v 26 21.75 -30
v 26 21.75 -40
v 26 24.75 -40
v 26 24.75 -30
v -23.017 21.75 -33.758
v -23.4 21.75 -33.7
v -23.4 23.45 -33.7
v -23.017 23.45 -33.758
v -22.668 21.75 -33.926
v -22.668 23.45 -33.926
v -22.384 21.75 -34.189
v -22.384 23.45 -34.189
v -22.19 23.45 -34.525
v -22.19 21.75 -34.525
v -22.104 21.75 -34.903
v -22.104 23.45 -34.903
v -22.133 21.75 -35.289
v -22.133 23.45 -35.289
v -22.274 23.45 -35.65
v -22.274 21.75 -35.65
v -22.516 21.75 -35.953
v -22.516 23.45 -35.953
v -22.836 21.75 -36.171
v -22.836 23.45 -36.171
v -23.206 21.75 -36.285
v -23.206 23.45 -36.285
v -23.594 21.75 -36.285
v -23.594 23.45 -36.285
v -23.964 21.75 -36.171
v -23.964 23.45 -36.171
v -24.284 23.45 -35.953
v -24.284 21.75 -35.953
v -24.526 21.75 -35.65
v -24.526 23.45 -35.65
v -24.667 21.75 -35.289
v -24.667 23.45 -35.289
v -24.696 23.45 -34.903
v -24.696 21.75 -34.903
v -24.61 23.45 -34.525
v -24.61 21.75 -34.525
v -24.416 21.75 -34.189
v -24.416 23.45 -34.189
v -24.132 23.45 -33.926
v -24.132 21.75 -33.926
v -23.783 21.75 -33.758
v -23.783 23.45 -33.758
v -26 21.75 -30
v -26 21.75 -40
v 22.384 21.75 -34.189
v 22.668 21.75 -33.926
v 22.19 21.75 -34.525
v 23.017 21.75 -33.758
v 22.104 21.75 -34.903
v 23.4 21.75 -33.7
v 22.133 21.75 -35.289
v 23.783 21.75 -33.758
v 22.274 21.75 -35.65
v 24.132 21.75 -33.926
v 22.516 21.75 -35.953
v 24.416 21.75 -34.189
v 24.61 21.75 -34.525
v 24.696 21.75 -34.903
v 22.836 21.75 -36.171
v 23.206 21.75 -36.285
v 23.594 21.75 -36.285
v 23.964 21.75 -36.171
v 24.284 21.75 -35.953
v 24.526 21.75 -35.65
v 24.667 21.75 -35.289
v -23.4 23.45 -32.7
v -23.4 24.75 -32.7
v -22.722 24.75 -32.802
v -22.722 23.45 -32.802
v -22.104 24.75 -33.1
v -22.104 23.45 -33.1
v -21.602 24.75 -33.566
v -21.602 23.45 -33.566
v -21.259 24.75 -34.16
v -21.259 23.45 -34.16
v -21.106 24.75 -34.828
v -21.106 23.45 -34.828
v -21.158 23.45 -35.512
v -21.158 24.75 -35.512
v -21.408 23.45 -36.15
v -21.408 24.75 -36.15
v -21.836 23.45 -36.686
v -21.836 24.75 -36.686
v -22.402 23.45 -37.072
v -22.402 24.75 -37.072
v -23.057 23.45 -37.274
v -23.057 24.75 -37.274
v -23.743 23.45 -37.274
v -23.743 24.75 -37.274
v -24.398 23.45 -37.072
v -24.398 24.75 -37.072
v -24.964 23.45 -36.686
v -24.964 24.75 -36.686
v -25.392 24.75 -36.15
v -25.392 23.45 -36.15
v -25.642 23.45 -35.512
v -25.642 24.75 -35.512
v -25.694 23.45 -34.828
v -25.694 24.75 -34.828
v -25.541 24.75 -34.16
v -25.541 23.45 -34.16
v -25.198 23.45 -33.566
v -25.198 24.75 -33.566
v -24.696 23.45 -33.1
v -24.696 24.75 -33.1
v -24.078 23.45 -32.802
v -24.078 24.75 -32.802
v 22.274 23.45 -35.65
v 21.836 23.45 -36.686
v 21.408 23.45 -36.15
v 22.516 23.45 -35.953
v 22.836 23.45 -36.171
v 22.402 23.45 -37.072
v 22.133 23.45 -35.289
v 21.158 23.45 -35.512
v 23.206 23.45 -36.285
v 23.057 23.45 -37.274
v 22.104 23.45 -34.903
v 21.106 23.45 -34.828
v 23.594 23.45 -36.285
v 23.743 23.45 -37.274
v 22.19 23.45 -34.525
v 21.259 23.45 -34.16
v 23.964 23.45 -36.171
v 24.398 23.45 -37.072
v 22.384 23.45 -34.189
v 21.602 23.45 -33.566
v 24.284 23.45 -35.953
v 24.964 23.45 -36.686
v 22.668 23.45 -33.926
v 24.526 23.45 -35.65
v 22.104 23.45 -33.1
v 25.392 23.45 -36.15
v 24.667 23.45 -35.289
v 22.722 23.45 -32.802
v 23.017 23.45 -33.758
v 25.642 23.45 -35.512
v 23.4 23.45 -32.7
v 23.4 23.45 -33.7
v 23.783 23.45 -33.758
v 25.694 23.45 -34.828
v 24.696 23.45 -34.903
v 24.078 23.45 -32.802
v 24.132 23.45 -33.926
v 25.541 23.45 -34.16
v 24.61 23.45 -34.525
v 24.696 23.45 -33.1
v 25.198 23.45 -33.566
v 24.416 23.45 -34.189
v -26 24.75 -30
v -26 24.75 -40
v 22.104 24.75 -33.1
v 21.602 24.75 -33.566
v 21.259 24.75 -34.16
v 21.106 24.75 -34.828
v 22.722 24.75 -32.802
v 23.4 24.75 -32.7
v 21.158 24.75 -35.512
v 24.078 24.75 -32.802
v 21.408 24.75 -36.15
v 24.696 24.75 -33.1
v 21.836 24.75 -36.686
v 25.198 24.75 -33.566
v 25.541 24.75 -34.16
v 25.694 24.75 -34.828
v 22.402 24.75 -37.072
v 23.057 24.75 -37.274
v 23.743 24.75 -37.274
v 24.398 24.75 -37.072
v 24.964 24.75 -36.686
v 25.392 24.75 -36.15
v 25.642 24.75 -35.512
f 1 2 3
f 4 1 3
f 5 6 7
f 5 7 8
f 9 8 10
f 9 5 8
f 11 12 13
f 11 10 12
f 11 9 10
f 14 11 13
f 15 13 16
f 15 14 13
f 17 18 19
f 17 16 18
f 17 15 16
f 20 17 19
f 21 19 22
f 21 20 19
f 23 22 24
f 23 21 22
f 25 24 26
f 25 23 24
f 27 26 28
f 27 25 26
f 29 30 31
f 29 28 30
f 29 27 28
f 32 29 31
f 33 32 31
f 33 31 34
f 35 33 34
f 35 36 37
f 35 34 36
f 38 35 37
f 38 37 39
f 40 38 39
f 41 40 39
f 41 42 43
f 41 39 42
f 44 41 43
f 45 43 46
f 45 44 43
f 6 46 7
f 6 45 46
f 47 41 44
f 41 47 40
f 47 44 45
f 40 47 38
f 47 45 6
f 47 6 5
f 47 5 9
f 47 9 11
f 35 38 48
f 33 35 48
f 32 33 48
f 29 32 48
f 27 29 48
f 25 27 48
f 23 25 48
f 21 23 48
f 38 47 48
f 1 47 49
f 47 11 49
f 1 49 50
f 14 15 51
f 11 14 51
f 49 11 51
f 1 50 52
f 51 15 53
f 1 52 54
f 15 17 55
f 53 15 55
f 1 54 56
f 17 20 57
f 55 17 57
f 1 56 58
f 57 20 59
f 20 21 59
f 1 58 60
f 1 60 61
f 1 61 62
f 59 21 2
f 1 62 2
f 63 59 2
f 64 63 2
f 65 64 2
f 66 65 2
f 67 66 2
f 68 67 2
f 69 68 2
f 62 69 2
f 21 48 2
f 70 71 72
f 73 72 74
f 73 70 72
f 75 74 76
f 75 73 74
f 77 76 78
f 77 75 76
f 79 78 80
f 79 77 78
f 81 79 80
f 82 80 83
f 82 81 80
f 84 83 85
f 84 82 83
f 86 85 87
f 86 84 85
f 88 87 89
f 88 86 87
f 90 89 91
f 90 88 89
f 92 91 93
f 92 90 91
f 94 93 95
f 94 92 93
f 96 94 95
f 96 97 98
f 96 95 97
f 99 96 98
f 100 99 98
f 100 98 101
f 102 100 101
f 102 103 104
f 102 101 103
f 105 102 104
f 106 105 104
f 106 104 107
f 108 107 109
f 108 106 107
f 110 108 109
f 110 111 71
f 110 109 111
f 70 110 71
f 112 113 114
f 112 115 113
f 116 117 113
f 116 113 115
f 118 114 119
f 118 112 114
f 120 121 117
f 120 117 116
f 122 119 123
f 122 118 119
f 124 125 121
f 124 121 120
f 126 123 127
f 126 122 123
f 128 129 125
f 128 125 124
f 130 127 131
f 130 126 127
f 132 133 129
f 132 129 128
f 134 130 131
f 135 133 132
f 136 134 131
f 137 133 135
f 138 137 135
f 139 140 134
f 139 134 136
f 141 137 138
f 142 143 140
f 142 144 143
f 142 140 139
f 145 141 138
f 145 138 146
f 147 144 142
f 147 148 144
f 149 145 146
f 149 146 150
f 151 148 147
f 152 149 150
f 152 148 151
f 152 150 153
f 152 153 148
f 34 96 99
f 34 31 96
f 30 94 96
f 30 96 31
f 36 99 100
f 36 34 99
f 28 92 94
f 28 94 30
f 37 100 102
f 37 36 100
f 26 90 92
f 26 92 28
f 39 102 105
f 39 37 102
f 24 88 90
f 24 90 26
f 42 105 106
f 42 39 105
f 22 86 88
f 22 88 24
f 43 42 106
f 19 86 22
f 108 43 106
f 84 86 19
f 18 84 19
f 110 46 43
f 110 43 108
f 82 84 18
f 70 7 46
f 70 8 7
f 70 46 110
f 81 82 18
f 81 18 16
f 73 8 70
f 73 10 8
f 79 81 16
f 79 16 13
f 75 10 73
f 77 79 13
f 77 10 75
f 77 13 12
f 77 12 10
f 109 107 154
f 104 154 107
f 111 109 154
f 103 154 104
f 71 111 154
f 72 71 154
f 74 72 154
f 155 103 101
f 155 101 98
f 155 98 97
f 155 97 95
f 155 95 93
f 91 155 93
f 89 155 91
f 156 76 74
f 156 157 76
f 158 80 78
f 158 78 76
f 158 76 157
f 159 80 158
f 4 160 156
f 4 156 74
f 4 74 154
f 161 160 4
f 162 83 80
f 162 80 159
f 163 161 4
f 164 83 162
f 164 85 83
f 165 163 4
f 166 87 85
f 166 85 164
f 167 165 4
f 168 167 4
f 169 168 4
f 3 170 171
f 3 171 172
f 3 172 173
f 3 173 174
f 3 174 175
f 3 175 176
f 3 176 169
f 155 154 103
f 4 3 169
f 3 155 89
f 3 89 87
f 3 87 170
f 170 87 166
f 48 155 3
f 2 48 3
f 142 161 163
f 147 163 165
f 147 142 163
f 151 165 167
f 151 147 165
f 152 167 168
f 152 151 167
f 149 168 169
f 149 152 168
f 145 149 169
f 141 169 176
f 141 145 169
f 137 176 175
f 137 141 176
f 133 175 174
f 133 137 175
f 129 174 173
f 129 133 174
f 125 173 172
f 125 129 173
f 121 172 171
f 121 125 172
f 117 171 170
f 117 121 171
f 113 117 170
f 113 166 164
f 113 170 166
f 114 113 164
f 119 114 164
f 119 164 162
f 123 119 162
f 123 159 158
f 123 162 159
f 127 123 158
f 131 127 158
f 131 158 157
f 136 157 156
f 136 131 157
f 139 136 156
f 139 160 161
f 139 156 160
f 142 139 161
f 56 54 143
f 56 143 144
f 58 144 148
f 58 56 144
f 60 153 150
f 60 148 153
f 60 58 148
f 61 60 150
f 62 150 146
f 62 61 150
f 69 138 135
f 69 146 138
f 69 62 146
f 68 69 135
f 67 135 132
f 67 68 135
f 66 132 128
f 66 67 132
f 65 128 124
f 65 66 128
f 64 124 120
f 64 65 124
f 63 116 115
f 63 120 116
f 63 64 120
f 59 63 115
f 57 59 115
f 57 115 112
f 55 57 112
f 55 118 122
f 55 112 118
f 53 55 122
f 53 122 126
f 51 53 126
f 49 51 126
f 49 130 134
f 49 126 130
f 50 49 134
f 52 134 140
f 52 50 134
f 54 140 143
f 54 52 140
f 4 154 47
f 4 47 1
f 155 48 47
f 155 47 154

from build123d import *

# Parameters (mm, degrees)
BOSS_EXTRUDE1_START = -40
SKETCH1_W           = 52
SKETCH1_H           = 3
BOSS_EXTRUDE1_DEPTH = 10
BOSS_EXTRUDE2_START = 20
SKETCH2_R           = 1.3
BOSS_EXTRUDE2_DEPTH = 6
BOSS_EXTRUDE3_START = 23.45
SKETCH3_R           = 2.3
BOSS_EXTRUDE3_DEPTH = 2.55
BOSS_EXTRUDE4_START = 20
SKETCH4_R           = 1.3
BOSS_EXTRUDE4_DEPTH = 6
BOSS_EXTRUDE5_START = 23.45
SKETCH5_R           = 2.3
BOSS_EXTRUDE5_DEPTH = 2.55


with BuildPart() as part:
    # Sketch1 → Boss-Extrude1 (new body)
    with BuildSketch(Plane.XY.offset(BOSS_EXTRUDE1_START)):
        with Locations((0, 23.25)):
            Rectangle(SKETCH1_W, SKETCH1_H)
    extrude(amount=BOSS_EXTRUDE1_DEPTH)


with BuildPart() as body_2:
    # Sketch2 → Boss-Extrude2 (new body)
    with BuildSketch(Plane(origin=(0, 0, 0), x_dir=(1, 0, 0), z_dir=(0, 1, 0)).offset(BOSS_EXTRUDE2_START)):
        with Locations(Location((-23.4, 35, 0), (0, 0, 270))):
            Circle(SKETCH2_R)
    extrude(amount=BOSS_EXTRUDE2_DEPTH)


with BuildPart() as part_1:
    add(part.part)

    # Combine1: cut body 2
    add(body_2.part, mode=Mode.SUBTRACT)


with BuildPart() as body_2_2:
    # Sketch3 → Boss-Extrude3 (new body)
    with BuildSketch(Plane(origin=(0, 0, 0), x_dir=(1, 0, 0), z_dir=(0, 1, 0)).offset(BOSS_EXTRUDE3_START)):
        with Locations(Location((-23.4, 35, 0), (0, 0, 270))):
            Circle(SKETCH3_R)
    extrude(amount=BOSS_EXTRUDE3_DEPTH)


with BuildPart() as part_2:
    add(part_1.part)

    # Combine2: cut body 2 2
    add(body_2_2.part, mode=Mode.SUBTRACT)


with BuildPart() as body_2_3:
    # Sketch4 → Boss-Extrude4 (new body)
    with BuildSketch(Plane(origin=(0, 0, 0), x_dir=(1, 0, 0), z_dir=(0, 1, 0)).offset(BOSS_EXTRUDE4_START)):
        with Locations(Location((23.4, 35, 0), (0, 0, 270))):
            Circle(SKETCH4_R)
    extrude(amount=BOSS_EXTRUDE4_DEPTH)


with BuildPart() as part_3:
    add(part_2.part)

    # Combine3: cut body 2 3
    add(body_2_3.part, mode=Mode.SUBTRACT)


with BuildPart() as body_2_4:
    # Sketch5 → Boss-Extrude5 (new body)
    with BuildSketch(Plane(origin=(0, 0, 0), x_dir=(1, 0, 0), z_dir=(0, 1, 0)).offset(BOSS_EXTRUDE5_START)):
        with Locations(Location((23.4, 35, 0), (0, 0, 270))):
            Circle(SKETCH5_R)
    extrude(amount=BOSS_EXTRUDE5_DEPTH)


with BuildPart() as part_4:
    add(part_3.part)

    # Combine4: cut body 2 4
    add(body_2_4.part, mode=Mode.SUBTRACT)


solid = part_4.part
